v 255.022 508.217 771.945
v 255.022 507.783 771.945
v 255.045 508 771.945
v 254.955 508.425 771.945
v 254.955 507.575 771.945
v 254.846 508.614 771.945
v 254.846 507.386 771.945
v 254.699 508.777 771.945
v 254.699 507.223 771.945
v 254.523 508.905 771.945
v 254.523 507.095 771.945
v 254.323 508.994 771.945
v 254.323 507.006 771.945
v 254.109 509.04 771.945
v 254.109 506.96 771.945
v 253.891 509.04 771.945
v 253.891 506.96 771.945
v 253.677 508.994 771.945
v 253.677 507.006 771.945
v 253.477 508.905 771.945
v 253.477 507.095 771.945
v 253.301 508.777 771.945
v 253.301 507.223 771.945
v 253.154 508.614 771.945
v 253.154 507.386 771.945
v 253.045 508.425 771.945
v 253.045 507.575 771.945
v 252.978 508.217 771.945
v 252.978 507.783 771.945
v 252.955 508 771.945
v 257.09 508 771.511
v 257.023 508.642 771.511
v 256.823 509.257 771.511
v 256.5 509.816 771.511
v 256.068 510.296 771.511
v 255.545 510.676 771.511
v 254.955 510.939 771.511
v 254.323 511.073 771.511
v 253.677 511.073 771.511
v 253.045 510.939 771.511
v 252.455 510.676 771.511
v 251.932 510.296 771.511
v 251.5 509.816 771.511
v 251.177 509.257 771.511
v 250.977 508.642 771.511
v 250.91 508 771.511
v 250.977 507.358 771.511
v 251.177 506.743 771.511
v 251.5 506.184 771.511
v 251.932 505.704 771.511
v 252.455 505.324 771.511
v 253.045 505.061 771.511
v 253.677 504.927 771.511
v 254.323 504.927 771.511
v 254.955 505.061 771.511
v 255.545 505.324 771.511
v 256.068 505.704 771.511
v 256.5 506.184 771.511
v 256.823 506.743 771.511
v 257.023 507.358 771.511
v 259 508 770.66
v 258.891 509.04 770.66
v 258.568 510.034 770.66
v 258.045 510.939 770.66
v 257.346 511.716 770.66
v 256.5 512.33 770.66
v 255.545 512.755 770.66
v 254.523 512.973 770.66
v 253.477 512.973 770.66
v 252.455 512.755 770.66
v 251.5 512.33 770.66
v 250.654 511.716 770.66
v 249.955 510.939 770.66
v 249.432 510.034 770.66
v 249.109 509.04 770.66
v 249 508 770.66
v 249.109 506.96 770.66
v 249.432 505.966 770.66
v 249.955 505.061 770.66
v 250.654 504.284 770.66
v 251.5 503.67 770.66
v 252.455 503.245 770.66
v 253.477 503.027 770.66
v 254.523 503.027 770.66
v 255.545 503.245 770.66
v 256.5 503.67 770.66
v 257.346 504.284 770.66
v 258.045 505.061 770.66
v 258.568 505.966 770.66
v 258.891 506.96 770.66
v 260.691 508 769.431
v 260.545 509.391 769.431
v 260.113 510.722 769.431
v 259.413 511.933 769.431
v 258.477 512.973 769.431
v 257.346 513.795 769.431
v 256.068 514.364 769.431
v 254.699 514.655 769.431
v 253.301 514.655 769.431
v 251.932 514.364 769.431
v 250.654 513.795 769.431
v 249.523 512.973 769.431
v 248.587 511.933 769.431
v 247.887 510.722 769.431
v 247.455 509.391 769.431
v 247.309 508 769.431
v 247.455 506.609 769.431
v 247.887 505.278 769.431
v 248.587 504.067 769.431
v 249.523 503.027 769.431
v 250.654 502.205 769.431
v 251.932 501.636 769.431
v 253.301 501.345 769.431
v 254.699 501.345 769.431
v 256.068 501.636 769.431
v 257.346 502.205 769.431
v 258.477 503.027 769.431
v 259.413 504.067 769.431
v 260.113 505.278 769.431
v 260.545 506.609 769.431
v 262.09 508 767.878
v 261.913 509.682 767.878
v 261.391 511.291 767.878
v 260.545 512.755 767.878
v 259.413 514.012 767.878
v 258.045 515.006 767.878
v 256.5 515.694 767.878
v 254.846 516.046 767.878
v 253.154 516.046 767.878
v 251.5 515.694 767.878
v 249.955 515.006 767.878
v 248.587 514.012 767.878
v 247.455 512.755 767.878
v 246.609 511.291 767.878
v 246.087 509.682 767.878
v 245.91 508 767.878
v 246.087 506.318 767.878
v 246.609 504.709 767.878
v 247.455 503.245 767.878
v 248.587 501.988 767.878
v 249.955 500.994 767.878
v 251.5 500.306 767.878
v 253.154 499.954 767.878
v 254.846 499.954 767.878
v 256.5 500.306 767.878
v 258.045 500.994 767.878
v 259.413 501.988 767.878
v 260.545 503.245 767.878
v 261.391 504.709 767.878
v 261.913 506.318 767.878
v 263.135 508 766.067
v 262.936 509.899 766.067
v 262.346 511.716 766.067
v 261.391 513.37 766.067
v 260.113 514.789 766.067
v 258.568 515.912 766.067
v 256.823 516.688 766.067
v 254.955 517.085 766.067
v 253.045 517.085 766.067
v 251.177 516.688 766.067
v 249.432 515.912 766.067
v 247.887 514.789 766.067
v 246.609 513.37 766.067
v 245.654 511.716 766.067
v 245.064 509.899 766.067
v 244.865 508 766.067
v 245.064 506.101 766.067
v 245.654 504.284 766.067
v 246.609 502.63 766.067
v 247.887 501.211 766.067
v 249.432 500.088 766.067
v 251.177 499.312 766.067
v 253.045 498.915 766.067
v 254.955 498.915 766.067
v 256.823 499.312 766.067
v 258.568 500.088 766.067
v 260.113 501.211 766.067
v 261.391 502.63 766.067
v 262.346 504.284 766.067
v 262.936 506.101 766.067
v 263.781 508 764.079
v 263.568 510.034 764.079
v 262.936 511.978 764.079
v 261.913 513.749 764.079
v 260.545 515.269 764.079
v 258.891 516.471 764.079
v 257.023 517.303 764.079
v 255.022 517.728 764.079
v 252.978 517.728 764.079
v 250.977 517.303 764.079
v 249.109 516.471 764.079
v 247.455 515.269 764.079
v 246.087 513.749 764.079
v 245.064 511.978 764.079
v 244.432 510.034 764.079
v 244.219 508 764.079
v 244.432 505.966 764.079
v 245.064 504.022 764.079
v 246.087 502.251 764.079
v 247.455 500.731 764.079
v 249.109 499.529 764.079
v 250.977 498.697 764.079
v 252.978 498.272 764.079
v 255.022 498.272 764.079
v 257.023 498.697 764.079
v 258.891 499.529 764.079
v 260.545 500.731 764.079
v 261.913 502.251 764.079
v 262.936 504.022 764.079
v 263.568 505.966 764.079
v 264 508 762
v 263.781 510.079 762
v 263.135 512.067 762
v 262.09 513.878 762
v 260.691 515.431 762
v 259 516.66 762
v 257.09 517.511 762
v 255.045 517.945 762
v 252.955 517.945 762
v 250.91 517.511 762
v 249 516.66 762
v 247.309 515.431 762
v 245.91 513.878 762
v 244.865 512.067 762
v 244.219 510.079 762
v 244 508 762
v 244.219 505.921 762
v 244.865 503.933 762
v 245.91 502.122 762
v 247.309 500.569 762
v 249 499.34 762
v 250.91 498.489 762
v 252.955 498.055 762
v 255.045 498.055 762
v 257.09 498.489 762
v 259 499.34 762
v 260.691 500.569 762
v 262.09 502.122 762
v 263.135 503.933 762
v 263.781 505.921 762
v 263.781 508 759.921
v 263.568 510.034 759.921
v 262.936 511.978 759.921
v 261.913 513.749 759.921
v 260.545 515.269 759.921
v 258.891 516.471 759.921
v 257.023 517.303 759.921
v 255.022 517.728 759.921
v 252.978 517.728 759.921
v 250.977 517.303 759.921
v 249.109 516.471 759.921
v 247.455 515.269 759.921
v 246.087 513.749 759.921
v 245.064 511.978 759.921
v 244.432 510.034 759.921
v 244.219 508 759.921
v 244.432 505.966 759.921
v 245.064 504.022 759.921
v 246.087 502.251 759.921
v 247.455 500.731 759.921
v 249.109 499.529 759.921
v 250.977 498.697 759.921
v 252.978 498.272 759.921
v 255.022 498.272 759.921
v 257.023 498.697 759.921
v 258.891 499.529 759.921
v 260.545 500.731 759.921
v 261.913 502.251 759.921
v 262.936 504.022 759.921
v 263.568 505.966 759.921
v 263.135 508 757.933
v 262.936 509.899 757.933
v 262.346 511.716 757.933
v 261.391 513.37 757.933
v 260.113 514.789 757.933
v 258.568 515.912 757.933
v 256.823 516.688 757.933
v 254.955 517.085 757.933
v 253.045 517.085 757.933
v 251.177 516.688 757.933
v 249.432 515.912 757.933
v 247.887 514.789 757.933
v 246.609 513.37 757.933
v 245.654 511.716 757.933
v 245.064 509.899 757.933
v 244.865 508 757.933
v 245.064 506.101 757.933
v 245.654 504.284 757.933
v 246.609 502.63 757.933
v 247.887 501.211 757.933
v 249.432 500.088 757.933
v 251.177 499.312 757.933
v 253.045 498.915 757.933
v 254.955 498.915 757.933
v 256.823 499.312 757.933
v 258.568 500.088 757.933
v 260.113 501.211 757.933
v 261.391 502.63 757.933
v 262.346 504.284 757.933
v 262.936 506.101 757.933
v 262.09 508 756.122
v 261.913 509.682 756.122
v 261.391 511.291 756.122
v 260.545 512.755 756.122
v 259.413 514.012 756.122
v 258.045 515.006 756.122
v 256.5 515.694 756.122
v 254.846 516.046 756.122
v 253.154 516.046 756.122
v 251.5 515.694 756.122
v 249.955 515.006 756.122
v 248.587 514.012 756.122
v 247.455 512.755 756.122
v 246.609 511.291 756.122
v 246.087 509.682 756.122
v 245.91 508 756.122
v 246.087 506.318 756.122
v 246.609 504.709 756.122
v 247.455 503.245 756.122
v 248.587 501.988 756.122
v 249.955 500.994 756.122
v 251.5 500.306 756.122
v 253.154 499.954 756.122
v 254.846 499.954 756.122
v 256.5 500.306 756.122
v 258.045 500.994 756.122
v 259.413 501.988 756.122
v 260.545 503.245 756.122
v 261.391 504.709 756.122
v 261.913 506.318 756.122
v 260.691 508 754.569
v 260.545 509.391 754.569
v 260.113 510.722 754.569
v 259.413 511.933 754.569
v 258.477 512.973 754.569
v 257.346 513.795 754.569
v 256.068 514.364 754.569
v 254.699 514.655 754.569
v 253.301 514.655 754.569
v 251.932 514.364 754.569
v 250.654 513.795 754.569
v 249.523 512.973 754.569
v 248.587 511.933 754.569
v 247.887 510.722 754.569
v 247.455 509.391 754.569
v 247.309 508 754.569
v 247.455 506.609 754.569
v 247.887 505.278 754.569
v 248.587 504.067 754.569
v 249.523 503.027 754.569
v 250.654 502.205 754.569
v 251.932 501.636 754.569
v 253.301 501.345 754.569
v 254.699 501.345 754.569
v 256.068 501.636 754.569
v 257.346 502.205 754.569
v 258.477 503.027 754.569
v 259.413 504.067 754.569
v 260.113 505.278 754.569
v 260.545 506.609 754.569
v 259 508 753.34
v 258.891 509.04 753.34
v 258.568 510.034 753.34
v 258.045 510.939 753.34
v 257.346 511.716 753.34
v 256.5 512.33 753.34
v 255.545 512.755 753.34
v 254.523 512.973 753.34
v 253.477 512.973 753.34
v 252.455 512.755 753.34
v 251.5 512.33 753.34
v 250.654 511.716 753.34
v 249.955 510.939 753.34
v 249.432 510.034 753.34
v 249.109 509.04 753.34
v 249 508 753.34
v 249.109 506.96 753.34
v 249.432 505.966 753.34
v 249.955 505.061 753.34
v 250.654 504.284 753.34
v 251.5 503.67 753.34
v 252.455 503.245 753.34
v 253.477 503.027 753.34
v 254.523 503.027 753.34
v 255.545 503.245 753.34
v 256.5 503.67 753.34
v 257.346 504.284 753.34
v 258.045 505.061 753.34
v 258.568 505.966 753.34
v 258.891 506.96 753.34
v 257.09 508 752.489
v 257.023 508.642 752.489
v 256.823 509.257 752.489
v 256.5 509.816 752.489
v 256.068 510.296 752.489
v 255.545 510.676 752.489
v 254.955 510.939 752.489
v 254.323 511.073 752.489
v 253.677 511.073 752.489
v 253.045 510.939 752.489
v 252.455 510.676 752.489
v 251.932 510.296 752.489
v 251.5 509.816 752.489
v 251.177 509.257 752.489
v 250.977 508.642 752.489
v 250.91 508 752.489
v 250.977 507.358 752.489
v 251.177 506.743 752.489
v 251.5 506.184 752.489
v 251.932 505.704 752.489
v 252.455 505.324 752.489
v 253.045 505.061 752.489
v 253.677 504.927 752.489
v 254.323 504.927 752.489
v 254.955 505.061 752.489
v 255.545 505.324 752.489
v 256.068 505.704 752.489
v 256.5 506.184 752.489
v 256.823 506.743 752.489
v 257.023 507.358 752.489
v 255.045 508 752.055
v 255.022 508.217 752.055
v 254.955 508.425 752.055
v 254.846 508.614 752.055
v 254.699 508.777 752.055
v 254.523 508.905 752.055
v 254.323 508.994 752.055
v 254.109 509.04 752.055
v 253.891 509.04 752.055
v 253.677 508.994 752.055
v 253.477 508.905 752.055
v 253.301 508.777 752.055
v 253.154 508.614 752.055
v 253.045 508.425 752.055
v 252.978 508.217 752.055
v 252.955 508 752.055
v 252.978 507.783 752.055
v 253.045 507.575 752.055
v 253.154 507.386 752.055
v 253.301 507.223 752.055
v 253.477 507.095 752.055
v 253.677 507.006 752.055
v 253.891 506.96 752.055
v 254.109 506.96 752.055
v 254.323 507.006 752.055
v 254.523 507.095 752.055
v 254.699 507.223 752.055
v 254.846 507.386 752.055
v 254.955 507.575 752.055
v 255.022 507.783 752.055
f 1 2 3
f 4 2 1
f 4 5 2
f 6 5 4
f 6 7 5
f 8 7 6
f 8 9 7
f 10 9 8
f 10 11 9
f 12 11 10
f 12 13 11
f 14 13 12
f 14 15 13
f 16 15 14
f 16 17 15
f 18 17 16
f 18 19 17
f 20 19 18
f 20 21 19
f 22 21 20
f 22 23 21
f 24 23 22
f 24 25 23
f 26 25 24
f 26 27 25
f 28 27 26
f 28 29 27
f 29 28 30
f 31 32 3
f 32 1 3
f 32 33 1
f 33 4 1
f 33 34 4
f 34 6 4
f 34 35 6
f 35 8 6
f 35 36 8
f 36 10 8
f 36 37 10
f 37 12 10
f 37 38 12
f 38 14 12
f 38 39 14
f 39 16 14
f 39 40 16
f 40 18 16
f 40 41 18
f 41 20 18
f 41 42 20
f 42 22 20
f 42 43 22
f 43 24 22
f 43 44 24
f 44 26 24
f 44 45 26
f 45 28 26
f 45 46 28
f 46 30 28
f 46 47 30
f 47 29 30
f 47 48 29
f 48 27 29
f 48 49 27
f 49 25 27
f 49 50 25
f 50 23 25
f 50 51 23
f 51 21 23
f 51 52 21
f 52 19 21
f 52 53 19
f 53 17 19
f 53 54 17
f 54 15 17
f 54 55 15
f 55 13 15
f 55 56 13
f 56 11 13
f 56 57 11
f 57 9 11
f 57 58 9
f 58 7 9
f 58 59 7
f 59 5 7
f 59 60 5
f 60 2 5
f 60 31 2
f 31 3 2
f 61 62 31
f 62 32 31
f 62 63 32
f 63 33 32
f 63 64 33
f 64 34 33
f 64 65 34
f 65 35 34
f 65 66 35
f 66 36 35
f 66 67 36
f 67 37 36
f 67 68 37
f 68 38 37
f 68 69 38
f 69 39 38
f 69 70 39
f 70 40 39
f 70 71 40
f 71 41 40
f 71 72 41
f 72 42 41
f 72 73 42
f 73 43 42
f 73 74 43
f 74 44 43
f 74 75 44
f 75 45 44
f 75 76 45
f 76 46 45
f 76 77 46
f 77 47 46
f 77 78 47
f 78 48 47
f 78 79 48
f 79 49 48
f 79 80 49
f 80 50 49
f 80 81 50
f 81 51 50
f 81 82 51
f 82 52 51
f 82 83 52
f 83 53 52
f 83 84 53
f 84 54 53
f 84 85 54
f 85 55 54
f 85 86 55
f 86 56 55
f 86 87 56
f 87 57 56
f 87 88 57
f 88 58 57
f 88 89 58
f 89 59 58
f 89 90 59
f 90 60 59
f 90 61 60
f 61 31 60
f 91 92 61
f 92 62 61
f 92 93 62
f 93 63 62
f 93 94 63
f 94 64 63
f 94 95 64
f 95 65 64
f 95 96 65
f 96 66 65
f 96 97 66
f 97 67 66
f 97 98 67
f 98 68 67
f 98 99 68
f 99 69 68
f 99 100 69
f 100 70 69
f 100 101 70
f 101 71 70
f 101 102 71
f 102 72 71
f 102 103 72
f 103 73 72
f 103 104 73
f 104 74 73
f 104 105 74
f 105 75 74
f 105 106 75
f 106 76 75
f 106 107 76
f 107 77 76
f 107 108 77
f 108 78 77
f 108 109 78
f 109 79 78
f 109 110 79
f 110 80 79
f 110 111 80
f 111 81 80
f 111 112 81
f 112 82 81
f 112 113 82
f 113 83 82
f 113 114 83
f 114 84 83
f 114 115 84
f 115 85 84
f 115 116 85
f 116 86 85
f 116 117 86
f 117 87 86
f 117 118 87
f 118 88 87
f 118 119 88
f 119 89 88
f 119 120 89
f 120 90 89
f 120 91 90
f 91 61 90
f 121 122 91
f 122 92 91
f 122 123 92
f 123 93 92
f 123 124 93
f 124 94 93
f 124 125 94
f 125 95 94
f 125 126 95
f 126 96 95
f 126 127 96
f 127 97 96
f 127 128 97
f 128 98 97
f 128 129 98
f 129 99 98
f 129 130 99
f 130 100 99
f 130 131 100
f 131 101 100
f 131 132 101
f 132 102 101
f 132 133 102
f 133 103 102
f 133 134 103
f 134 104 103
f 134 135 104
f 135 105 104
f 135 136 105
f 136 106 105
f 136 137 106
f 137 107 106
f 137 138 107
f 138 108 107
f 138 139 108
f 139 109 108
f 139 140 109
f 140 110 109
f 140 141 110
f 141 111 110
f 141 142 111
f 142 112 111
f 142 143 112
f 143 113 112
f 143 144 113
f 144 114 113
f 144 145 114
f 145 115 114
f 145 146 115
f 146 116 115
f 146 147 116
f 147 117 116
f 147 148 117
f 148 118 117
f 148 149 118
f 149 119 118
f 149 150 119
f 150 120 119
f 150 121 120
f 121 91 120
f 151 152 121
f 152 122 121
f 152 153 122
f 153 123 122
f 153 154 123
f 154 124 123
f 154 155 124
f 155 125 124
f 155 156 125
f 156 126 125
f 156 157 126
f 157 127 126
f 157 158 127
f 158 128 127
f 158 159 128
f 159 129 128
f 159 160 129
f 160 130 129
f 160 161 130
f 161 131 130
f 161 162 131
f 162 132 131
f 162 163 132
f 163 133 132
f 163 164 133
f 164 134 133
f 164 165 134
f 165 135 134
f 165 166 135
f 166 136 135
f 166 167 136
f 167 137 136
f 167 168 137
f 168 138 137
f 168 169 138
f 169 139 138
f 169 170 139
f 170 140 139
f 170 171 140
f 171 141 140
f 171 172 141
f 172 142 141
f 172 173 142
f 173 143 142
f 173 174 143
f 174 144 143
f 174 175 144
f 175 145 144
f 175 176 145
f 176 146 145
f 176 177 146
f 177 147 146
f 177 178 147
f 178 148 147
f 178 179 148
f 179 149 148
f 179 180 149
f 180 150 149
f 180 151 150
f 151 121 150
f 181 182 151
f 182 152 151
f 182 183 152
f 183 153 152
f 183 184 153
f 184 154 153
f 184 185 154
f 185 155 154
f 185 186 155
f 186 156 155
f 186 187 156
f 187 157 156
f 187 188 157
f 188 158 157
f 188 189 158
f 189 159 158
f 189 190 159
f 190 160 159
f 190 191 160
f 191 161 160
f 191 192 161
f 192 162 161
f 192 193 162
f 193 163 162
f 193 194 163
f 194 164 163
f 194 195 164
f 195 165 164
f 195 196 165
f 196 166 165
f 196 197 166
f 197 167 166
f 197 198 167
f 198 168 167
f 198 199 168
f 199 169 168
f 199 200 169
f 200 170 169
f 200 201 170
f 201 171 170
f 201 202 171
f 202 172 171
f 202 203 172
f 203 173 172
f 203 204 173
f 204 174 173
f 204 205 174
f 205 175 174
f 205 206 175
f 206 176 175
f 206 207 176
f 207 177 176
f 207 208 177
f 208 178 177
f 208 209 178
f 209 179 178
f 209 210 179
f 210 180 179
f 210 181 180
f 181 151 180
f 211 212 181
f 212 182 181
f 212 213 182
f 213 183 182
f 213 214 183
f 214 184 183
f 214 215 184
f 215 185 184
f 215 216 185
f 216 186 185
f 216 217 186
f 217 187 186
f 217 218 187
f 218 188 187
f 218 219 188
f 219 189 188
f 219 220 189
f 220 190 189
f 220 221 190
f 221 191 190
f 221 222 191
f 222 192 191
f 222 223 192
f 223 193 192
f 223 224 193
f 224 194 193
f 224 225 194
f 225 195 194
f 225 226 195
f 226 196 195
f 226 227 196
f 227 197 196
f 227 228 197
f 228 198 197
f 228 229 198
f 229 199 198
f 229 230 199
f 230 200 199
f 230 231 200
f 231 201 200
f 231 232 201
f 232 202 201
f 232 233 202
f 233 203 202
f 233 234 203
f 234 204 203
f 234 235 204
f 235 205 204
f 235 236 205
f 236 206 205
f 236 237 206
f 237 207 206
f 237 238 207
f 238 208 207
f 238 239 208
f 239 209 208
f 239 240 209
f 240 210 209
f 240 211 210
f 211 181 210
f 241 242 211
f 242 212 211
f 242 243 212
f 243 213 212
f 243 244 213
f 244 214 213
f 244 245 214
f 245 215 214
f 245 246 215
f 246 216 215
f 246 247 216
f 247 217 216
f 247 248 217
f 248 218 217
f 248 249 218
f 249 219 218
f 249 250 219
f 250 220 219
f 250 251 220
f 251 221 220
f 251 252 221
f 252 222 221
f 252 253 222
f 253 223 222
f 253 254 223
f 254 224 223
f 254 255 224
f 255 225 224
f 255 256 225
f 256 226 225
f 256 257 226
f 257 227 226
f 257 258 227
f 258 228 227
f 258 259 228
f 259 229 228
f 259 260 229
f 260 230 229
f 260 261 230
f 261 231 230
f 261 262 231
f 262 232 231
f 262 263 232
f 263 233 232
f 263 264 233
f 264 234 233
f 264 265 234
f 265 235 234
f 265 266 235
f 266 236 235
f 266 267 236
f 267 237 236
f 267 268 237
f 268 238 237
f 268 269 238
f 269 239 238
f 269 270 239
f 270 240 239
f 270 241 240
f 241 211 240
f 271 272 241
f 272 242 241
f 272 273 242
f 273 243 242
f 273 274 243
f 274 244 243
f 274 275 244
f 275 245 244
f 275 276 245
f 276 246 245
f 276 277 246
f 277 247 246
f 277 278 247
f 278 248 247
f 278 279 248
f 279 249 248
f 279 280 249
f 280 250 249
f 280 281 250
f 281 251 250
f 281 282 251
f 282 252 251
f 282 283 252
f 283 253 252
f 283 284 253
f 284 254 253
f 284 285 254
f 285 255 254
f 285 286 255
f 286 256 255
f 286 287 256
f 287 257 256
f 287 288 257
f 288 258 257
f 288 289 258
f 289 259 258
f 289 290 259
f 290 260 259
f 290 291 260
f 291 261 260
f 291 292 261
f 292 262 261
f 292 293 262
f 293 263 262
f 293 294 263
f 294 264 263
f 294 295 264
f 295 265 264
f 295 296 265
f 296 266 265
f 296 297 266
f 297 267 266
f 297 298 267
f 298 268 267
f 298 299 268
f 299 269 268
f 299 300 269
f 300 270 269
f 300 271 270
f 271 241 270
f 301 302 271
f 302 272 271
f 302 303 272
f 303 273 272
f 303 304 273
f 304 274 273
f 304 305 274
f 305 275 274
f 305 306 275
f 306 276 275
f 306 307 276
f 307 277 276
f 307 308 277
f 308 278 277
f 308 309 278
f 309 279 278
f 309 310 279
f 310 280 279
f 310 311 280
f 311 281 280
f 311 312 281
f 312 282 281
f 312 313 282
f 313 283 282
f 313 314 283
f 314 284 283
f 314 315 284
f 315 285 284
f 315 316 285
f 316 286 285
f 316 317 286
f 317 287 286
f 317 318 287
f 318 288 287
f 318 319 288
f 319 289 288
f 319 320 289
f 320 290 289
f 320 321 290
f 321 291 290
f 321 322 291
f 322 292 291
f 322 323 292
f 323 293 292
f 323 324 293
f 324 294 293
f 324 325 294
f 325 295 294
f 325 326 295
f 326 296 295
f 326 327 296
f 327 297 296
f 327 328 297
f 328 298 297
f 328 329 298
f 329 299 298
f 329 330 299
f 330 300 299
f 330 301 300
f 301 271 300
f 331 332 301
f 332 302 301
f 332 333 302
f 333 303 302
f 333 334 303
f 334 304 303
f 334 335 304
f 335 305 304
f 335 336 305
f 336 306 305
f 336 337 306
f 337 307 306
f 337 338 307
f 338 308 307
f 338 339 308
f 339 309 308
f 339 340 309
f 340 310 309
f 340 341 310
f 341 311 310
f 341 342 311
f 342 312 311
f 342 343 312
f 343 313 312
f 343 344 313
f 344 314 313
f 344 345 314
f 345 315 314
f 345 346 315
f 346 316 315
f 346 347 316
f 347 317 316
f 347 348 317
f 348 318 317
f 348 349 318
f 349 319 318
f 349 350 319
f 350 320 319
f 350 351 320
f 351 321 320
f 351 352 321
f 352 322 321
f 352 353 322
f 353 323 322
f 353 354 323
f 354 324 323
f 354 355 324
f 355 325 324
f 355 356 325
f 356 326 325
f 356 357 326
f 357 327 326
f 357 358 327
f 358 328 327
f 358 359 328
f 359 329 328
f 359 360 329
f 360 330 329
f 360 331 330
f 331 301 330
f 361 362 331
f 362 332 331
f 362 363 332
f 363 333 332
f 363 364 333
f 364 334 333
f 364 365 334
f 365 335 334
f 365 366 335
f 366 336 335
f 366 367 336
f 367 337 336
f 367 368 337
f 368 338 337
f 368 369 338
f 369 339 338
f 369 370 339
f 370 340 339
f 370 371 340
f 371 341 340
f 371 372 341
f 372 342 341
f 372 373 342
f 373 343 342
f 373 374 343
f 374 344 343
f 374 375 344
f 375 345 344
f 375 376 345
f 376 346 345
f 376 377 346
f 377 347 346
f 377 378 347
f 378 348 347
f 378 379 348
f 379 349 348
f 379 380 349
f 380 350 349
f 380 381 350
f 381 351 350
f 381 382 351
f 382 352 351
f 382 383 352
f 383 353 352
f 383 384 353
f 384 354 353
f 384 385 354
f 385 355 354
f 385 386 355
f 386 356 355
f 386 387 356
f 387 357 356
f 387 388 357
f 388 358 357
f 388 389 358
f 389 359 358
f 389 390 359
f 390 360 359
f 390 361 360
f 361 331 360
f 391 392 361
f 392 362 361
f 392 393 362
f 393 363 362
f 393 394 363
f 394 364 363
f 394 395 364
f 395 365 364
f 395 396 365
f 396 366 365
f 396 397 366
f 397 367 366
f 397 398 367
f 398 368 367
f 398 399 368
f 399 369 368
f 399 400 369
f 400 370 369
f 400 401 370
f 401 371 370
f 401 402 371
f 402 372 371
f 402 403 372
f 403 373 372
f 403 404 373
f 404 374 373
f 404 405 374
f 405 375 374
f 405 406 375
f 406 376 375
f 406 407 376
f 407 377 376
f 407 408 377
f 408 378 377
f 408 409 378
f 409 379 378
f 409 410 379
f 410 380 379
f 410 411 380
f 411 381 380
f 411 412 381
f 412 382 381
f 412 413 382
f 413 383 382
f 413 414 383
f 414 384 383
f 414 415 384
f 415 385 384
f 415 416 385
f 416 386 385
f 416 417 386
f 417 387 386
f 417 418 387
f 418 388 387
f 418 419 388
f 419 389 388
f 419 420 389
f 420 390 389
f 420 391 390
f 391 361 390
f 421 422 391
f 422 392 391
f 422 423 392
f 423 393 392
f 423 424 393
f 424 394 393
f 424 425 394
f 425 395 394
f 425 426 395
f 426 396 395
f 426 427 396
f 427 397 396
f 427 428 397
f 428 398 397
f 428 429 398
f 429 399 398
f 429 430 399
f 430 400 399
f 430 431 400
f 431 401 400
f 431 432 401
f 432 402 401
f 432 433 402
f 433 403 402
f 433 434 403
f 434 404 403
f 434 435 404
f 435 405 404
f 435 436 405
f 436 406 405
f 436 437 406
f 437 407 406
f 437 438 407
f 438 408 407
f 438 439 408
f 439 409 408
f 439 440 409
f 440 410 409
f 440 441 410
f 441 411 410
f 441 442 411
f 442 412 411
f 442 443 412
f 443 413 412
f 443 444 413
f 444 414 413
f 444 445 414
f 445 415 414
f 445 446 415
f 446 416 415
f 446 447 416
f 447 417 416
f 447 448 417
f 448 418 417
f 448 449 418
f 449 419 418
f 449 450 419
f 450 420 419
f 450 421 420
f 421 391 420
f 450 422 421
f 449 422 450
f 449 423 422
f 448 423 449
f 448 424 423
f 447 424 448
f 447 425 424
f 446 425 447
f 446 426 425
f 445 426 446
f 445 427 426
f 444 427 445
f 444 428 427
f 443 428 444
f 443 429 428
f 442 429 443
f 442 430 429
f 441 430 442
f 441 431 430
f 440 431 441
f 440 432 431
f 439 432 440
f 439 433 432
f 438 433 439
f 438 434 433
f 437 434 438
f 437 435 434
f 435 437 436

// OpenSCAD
// Unit of length: Unit.MM
translate(v = [254.0, 508.0, 762.0])
{
   sphere(d = 20.0);
}
